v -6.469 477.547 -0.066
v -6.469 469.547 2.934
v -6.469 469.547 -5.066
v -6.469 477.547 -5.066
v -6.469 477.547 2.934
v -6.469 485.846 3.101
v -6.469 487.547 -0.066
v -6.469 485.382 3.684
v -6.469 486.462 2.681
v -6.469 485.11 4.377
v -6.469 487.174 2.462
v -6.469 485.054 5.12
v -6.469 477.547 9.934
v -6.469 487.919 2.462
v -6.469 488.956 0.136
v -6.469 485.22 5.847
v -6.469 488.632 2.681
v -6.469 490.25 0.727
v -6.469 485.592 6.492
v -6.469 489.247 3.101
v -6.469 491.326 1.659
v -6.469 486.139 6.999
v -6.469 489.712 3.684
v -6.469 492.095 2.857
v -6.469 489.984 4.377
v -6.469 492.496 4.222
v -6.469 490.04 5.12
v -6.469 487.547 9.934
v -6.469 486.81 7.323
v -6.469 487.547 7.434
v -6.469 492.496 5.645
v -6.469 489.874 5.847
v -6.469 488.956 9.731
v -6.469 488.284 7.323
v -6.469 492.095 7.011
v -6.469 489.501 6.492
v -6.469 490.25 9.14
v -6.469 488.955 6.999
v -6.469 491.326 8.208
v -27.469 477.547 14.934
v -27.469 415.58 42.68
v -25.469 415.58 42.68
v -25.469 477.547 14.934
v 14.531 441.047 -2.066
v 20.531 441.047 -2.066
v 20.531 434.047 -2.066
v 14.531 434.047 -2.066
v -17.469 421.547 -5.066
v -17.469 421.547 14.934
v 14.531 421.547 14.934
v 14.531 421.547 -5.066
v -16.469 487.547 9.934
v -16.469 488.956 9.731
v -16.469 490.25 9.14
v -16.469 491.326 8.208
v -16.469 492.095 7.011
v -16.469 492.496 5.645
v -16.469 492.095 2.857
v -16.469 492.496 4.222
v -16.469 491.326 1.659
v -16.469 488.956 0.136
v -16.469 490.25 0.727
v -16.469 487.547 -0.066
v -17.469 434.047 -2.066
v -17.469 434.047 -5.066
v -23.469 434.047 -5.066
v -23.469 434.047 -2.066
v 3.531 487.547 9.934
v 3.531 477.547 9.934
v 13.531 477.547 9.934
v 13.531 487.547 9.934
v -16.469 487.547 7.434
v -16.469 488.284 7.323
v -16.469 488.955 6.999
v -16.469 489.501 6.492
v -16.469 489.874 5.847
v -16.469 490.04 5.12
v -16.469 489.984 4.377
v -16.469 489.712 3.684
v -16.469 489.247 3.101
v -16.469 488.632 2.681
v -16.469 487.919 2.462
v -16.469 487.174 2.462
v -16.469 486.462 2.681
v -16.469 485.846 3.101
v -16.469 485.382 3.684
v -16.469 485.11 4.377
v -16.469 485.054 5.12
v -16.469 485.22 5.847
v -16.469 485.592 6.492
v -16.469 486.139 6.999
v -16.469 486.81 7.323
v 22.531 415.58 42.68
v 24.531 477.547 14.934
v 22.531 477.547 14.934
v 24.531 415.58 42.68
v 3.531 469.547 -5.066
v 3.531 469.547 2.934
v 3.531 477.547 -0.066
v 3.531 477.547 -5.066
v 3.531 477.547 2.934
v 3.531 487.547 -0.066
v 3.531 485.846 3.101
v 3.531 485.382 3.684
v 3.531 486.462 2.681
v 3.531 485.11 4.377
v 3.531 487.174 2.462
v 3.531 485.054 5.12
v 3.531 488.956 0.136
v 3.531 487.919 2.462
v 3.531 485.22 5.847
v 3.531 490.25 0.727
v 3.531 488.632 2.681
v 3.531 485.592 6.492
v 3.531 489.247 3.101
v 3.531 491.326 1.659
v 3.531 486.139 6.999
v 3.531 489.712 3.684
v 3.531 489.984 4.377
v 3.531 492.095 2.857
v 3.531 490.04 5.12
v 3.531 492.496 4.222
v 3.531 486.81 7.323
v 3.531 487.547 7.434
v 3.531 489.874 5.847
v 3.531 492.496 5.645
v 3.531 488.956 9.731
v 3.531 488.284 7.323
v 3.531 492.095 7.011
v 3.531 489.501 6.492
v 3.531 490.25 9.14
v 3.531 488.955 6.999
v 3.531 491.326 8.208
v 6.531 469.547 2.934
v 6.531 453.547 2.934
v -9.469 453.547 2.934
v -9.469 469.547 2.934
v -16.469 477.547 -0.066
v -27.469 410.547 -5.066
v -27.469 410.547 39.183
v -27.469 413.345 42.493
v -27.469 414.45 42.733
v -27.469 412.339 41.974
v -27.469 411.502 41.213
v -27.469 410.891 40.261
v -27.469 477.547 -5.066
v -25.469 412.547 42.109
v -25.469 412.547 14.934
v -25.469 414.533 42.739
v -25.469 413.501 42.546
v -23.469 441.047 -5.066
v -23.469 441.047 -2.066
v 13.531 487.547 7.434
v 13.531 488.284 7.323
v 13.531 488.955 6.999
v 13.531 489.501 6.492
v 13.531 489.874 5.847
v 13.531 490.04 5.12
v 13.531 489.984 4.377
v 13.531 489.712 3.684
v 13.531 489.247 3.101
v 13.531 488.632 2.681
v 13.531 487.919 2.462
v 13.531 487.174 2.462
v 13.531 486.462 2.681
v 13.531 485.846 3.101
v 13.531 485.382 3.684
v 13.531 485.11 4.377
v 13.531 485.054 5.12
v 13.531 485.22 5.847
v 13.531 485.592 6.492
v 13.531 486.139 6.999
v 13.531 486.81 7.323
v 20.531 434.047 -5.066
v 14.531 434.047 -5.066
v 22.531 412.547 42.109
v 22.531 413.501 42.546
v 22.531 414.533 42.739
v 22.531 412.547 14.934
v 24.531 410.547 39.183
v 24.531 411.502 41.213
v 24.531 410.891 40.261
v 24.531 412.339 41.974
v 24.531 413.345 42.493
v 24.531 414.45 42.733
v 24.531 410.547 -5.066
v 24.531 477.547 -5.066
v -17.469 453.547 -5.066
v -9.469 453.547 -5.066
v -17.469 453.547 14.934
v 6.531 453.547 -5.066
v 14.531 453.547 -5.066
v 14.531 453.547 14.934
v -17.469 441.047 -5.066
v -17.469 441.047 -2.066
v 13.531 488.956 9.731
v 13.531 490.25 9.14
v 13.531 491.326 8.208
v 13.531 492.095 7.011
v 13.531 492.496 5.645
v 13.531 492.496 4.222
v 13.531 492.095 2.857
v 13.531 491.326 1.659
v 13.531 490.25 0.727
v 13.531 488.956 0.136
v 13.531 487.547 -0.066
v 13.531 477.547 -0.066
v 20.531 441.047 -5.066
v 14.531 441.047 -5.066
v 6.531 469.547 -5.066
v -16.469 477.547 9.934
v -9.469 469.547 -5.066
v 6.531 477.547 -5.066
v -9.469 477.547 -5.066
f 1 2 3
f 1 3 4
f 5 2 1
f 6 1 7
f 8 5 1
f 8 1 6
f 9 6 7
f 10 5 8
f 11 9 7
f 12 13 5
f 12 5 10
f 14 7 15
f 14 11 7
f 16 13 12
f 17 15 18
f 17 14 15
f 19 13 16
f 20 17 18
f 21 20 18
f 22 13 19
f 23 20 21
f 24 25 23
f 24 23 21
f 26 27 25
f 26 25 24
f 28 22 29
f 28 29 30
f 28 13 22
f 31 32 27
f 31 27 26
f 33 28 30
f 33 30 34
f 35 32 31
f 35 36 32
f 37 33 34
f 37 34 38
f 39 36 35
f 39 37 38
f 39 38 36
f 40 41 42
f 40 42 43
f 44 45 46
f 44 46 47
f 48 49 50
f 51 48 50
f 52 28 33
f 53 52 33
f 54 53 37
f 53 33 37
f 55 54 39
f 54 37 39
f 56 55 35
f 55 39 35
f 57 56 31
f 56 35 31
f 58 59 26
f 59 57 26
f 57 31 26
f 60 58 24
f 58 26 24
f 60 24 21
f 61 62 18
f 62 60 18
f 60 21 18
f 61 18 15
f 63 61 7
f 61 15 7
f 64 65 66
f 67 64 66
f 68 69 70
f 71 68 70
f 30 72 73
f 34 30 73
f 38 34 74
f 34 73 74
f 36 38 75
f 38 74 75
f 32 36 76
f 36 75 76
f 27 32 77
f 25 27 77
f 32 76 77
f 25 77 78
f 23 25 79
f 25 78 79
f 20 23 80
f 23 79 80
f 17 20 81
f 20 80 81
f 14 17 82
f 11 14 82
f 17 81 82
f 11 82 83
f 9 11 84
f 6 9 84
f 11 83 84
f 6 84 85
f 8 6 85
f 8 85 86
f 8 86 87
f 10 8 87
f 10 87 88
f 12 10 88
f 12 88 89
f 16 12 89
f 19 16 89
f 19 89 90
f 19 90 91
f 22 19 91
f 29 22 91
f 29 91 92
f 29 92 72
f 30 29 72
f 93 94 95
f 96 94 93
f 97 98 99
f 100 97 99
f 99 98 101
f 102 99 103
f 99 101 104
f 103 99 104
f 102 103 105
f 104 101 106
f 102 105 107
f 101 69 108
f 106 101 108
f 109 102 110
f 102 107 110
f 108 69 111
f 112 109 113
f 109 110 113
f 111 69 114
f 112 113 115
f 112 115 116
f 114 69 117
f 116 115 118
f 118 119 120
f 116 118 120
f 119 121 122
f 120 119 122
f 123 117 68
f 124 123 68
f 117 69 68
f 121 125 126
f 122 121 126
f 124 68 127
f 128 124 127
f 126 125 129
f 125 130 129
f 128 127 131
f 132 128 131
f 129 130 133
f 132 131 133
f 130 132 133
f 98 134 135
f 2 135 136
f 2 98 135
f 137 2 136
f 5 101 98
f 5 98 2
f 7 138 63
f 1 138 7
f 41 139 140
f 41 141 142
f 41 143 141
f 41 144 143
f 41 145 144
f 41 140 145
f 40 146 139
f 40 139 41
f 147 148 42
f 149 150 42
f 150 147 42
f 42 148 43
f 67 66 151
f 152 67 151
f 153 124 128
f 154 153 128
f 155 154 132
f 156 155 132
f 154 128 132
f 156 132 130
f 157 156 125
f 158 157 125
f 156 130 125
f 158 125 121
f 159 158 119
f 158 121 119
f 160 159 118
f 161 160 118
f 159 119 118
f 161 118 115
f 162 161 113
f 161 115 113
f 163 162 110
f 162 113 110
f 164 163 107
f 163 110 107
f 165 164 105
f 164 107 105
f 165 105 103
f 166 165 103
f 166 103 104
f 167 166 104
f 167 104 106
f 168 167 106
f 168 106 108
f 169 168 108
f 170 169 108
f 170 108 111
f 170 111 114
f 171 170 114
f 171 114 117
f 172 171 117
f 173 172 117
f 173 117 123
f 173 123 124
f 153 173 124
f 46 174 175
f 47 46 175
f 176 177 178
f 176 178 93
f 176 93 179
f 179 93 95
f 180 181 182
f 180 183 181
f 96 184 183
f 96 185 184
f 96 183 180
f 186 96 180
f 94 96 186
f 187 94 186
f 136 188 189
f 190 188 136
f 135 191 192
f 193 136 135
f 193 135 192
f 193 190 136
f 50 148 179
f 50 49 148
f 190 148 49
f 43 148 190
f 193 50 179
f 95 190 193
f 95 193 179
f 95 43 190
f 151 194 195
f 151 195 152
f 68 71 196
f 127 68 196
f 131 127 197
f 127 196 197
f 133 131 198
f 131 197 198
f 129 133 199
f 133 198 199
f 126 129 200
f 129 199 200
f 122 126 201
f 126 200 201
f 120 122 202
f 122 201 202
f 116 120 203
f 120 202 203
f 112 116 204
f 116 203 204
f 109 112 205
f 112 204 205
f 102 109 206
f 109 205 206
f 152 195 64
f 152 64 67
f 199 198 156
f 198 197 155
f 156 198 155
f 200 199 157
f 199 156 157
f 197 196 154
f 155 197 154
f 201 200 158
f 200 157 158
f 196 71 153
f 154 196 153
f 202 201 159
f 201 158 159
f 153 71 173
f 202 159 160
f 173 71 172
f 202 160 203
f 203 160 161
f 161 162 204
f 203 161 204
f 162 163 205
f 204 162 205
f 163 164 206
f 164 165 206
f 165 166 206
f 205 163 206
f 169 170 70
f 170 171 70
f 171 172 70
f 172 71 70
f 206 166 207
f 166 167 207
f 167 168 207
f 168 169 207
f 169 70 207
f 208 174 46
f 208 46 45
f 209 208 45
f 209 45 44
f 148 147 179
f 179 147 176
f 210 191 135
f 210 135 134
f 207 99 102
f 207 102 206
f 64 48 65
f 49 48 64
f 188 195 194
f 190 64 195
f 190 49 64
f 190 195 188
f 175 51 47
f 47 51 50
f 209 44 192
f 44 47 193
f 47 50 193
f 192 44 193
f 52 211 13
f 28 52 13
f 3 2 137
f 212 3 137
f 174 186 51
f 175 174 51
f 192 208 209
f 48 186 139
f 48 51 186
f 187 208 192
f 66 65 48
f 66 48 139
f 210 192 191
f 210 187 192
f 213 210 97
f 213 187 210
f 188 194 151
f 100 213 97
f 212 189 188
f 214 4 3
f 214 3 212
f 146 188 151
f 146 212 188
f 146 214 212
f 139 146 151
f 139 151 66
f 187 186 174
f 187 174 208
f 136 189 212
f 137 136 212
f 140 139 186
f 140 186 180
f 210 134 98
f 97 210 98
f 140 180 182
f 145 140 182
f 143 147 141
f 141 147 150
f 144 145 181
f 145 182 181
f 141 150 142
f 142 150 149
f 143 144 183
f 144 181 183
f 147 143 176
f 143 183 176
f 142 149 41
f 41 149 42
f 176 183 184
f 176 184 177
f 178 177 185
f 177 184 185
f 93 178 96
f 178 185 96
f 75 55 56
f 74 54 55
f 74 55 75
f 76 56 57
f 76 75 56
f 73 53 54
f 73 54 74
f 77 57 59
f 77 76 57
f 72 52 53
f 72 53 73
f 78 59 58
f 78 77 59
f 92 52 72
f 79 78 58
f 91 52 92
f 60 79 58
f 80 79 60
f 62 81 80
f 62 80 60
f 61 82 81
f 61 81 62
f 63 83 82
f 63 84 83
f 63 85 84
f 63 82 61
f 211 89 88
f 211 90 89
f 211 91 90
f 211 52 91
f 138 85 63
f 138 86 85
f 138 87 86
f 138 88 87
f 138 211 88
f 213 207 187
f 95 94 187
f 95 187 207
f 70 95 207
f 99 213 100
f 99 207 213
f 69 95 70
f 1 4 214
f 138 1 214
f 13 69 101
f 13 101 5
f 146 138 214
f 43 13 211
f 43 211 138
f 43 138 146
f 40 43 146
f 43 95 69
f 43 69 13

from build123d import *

# Parameters (mm, degrees)
SKETCH1_W            = 50
SKETCH1_H            = 40
BOSS_EXTRUDE1_DEPTH  = 10
SKETCH5_W            = 6
SKETCH5_H            = 5
BOSS_EXTRUDE3_DEPTH  = 10
SKETCH6_R            = 2
CUT_EXTRUDE1_DEPTH   = 20
SKETCH8_W            = 10
SKETCH8_H            = 40
CUT_EXTRUDE2_DEPTH   = 25
SKETCH9_W            = 10
SKETCH9_H            = 6
SKETCH9_R            = 1.930897171
BOSS_EXTRUDE4_DEPTH  = 5
SKETCH10_W           = 10
SKETCH10_H           = 5
CUT_EXTRUDE3_DEPTH   = 15
SKETCH11_W           = 5
SKETCH11_H           = 5
BOSS_EXTRUDE5_DEPTH  = 10
SKETCH12_R           = 1.5
CUT_EXTRUDE4_DEPTH   = 10
SKETCH13_W           = 6
SKETCH13_H           = 5
CUT_EXTRUDE5_DEPTH   = 10
SKETCH15_W           = 5
SKETCH15_H           = 5
BOSS_EXTRUDE7_DEPTH  = 10
SKETCH18_W           = 5
SKETCH18_H           = 5
CUT_EXTRUDE7_DEPTH   = 10
SKETCH19_R           = 1.25
CUT_EXTRUDE8_DEPTH   = 43
CUT_EXTRUDE9_DEPTH   = 20
SKETCH21_W           = 16
SKETCH21_H           = 16
CUT_EXTRUDE10_DEPTH  = 30
SKETCH22_W           = 8
SKETCH22_H           = 12
CUT_EXTRUDE11_DEPTH  = 4
SCALE2_SCALE         = 2
CUT_EXTRUDE12_DEPTH  = 30
SKETCH24_W           = 44
SKETCH24_H           = 7
CUT_EXTRUDE13_DEPTH  = 3
SKETCH25_W           = 3
SKETCH25_H           = 8
BOSS_EXTRUDE8_DEPTH  = 8
BOSS_EXTRUDE9_DEPTH  = 2
SKETCH27_W           = 52
SKETCH27_H           = 50
BOSS_EXTRUDE10_DEPTH = 2
BOSS_EXTRUDE11_DEPTH = 2
CUT_EXTRUDE15_DEPTH  = 64


with BuildPart() as part:
    # Sketch1 → Boss-Extrude1 (new body)
    with BuildSketch(Plane(origin=(669.84184187, 0, 0), x_dir=(1, 0, 0), z_dir=(0, 0, 1))):
        with Locations((-671.310344828, 437.637931034)):
            Rectangle(SKETCH1_W, SKETCH1_H)
    boss_extrude1 = extrude(amount=BOSS_EXTRUDE1_DEPTH)

    # Sketch5 → Boss-Extrude3 (add)
    with BuildSketch(Plane(origin=(23.531497042, 0, 0), x_dir=(0, 0, -1), z_dir=(1, 0, 0))):
        with Locations((-5, 442.637931034)):
            Rectangle(SKETCH5_W, SKETCH5_H)
        with Locations((-5, 432.637931034)):
            Rectangle(SKETCH5_W, SKETCH5_H)
    extrude(amount=BOSS_EXTRUDE3_DEPTH)

    # Sketch6 → Cut-Extrude1 (cut)
    with BuildSketch(Plane(origin=(669.84184187, 445.137931034, 0), x_dir=(1, 0, 0), z_dir=(0, 1, 0))):
        with Locations(Location((-641.310344828, -5, 0), (0, 0, 180))):
            Circle(SKETCH6_R)
    extrude(amount=-CUT_EXTRUDE1_DEPTH, mode=Mode.SUBTRACT)

    # Sketch8 → Cut-Extrude2 (cut)
    with BuildSketch(Plane.ZY.offset(26.468502958)):
        with Locations((5, 437.637931034)):
            Rectangle(SKETCH8_W, SKETCH8_H)
    extrude(amount=-CUT_EXTRUDE2_DEPTH, mode=Mode.SUBTRACT)

    # Sketch9 → Boss-Extrude4 (add)
    with BuildSketch(Plane(origin=(0, 435.137931034, 0), x_dir=(1, 0, 0), z_dir=(0, 1, 0))):
        with Locations((28.531497042, -5)):
            Rectangle(SKETCH9_W, SKETCH9_H)
        with Locations(Location((28.531497042, -5, 0), (0, 0, 180))):
            Circle(SKETCH9_R, mode=Mode.SUBTRACT)
    extrude(amount=BOSS_EXTRUDE4_DEPTH)

    # Sketch10 → Cut-Extrude3 (cut)
    with BuildSketch(Plane.XY.offset(8)):
        with Locations((28.531497042, 432.637931034)):
            Rectangle(SKETCH10_W, SKETCH10_H)
        with Locations((28.531497042, 442.637931034)):
            Rectangle(SKETCH10_W, SKETCH10_H)
    extrude(amount=-CUT_EXTRUDE3_DEPTH, mode=Mode.SUBTRACT)

    # Mirror1: Boss-Extrude1 across plane
    add(boss_extrude1.mirror(Plane(origin=(-1.468502958, 0, 0), x_dir=(0, 0, 1), z_dir=(1, 0, 0))))

    # Sketch11 → Boss-Extrude5 (add)
    with BuildSketch(Plane(origin=(0, 457.637931034, 0), x_dir=(1, 0, 0), z_dir=(0, 1, 0))):
        with Locations((-1.468502958, -5)):
            Rectangle(SKETCH11_W, SKETCH11_H)
    extrude(amount=BOSS_EXTRUDE5_DEPTH)

    # Sketch12 → Cut-Extrude4 (cut)
    with BuildSketch(Plane(origin=(1.031497042, 0, 0), x_dir=(0, 0, -1), z_dir=(1, 0, 0))):
        with Locations((-5, 462.637931034)):
            Circle(SKETCH12_R)
    extrude(amount=-CUT_EXTRUDE4_DEPTH, mode=Mode.SUBTRACT)

    # Sketch13 → Cut-Extrude5 (cut)
    with BuildSketch(Plane(origin=(33.531497042, 0, 0), x_dir=(0, 0, -1), z_dir=(1, 0, 0))):
        with Locations((-5, 437.637931034)):
            Rectangle(SKETCH13_W, SKETCH13_H)
    extrude(amount=-CUT_EXTRUDE5_DEPTH, mode=Mode.SUBTRACT)

    # Sketch15 → Boss-Extrude7 (add)
    with BuildSketch(Plane(origin=(0, 457.637931034, 0), x_dir=(1, 0, 0), z_dir=(0, 1, 0))):
        with Locations((-6.468502958, -5)):
            Rectangle(SKETCH15_W, SKETCH15_H)
        with Locations((3.531497042, -5)):
            Rectangle(SKETCH15_W, SKETCH15_H)
    extrude(amount=BOSS_EXTRUDE7_DEPTH)

    # Sketch18 → Cut-Extrude7 (cut)
    with BuildSketch(Plane(origin=(0, 467.637931034, 0), x_dir=(1, 0, 0), z_dir=(0, 1, 0))):
        with Locations((-1.468502958, -5)):
            Rectangle(SKETCH18_W, SKETCH18_H)
    extrude(amount=-CUT_EXTRUDE7_DEPTH, mode=Mode.SUBTRACT)

    # Sketch19 → Cut-Extrude8 (cut)
    with BuildSketch(Plane.ZY.offset(8.968502958)):
        with Locations((5, 462.637931034)):
            Circle(SKETCH19_R)
    extrude(amount=-CUT_EXTRUDE8_DEPTH, mode=Mode.SUBTRACT)

    # Sketch20 → Cut-Extrude9 (cut)
    with BuildSketch(Plane(origin=(6.031497042, 0, 0), x_dir=(0, 0, -1), z_dir=(1, 0, 0))):
        with BuildLine():
            Line((-7.5, 467.637931034), (-7.5, 462.637931034))
            ThreePointArc((-7.5, 462.637931034), (-5, 465.137931034), (-2.5, 462.637931034))
            Line((-2.5, 462.637931034), (-2.5, 467.637931034))
            Line((-2.5, 467.637931034), (-7.5, 467.637931034))
        make_face()
    extrude(amount=-CUT_EXTRUDE9_DEPTH, mode=Mode.SUBTRACT)

    # Sketch21 → Cut-Extrude10 (cut)
    with BuildSketch(Plane.XY.offset(10)):
        with Locations((-1.468502958, 437.637931034)):
            Rectangle(SKETCH21_W, SKETCH21_H)
    extrude(amount=-CUT_EXTRUDE10_DEPTH, mode=Mode.SUBTRACT)

    # Sketch22 → Cut-Extrude11 (cut)
    with BuildSketch(Plane(origin=(0, 0, 0), x_dir=(-1, 0, 0), z_dir=(0, 0, -1))):
        with Locations((1.468502958, 451.637931034)):
            Rectangle(SKETCH22_W, SKETCH22_H)
    extrude(amount=-CUT_EXTRUDE11_DEPTH, mode=Mode.SUBTRACT)


with BuildPart() as part_1:
    # Scale2: scaled about (-1.468502958, 437.728990864, 5.066378231)
    add(part.part.scale(SCALE2_SCALE).moved(Location((1.468502958, -437.728990864, -5.066378231))))

    # Sketch23 → Cut-Extrude12 (cut)
    with BuildSketch(Plane(origin=(0, 0, -5.066378231), x_dir=(-1, 0, 0), z_dir=(0, 0, -1))):
        Polygon((27.468502958, 495.287404552), (27.468502958, 477.546871205), (51.468502958, 477.546871205), (51.468502958, 397.546871205), (-48.531497042, 397.546871205), (-48.531497042, 477.546871205), (-24.531497042, 477.546871205), (-24.531497042, 495.287404552), (-71.530370383, 495.287404552), (-71.530370383, 371.111775085), (85.960671869, 371.111775085), (85.960671869, 495.287404552), align=None)
        Polygon((51.468502958, 477.546871205), (27.468502958, 477.546871205), (27.468502958, 410.546871205), (-24.531497042, 410.546871205), (-24.531497042, 477.546871205), (-48.531497042, 477.546871205), (-48.531497042, 397.546871205), (51.468502958, 397.546871205), align=None)
    extrude(amount=-CUT_EXTRUDE12_DEPTH, mode=Mode.SUBTRACT)

    # Sketch24 → Cut-Extrude13 (cut)
    with BuildSketch(Plane(origin=(0, 0, -5.066378231), x_dir=(-1, 0, 0), z_dir=(0, 0, -1))):
        with Locations((1.468502958, 437.546871205)):
            Rectangle(SKETCH24_W, SKETCH24_H)
    extrude(amount=-CUT_EXTRUDE13_DEPTH, mode=Mode.SUBTRACT)

    # Sketch25 → Boss-Extrude8 (add)
    with BuildSketch(Plane(origin=(0, 0, 2.933621769), x_dir=(-1, 0, 0), z_dir=(0, 0, -1))):
        with Locations((-5.031497042, 473.546871205)):
            Rectangle(SKETCH25_W, SKETCH25_H)
        with Locations((7.968502958, 473.546871205)):
            Rectangle(SKETCH25_W, SKETCH25_H)
    extrude(amount=BOSS_EXTRUDE8_DEPTH)

    # Sketch26 → Boss-Extrude9 (add)
    with BuildSketch(Plane.ZY.offset(27.468502958)):
        Polygon((44.933621769, 410.546871205), (14.933621769, 477.546871205), (14.933621769, 410.546871205), align=None)
    extrude(amount=-BOSS_EXTRUDE9_DEPTH)

    # Sketch27 → Boss-Extrude10 (add)
    with BuildSketch(Plane.XZ.offset(-410.546871205)):
        with Locations((-1.468502958, 19.933621769)):
            Rectangle(SKETCH27_W, SKETCH27_H)
    extrude(amount=-BOSS_EXTRUDE10_DEPTH)

    # Sketch28 → Boss-Extrude11 (add)
    with BuildSketch(Plane(origin=(24.531497042, 0, 0), x_dir=(0, 0, -1), z_dir=(1, 0, 0))):
        Polygon((-14.933621769, 477.546871205), (-44.933621769, 410.546871205), (5.066378231, 410.546871205), align=None)
    extrude(amount=-BOSS_EXTRUDE11_DEPTH)

    # Sketch31 → Cut-Extrude15 (cut)
    with BuildSketch(Plane(origin=(24.531497042, 0, 0), x_dir=(0, 0, -1), z_dir=(1, 0, 0))):
        with BuildLine():
            Line((-42.679814302, 415.580374548), (-51.64215649, 418.145209821))
            Line((-51.64215649, 418.145209821), (-53.81664241, 410.546871205))
            Line((-53.81664241, 410.546871205), (-41.973839944, 407.710599457))
            Line((-41.973839944, 407.710599457), (-39.182920234, 410.546871205))
            ThreePointArc((-39.182920234, 410.546871205), (-41.973839944, 412.339392402), (-42.679814302, 415.580374548))
        make_face()
    extrude(amount=-CUT_EXTRUDE15_DEPTH, mode=Mode.SUBTRACT)


solid = part_1.part
